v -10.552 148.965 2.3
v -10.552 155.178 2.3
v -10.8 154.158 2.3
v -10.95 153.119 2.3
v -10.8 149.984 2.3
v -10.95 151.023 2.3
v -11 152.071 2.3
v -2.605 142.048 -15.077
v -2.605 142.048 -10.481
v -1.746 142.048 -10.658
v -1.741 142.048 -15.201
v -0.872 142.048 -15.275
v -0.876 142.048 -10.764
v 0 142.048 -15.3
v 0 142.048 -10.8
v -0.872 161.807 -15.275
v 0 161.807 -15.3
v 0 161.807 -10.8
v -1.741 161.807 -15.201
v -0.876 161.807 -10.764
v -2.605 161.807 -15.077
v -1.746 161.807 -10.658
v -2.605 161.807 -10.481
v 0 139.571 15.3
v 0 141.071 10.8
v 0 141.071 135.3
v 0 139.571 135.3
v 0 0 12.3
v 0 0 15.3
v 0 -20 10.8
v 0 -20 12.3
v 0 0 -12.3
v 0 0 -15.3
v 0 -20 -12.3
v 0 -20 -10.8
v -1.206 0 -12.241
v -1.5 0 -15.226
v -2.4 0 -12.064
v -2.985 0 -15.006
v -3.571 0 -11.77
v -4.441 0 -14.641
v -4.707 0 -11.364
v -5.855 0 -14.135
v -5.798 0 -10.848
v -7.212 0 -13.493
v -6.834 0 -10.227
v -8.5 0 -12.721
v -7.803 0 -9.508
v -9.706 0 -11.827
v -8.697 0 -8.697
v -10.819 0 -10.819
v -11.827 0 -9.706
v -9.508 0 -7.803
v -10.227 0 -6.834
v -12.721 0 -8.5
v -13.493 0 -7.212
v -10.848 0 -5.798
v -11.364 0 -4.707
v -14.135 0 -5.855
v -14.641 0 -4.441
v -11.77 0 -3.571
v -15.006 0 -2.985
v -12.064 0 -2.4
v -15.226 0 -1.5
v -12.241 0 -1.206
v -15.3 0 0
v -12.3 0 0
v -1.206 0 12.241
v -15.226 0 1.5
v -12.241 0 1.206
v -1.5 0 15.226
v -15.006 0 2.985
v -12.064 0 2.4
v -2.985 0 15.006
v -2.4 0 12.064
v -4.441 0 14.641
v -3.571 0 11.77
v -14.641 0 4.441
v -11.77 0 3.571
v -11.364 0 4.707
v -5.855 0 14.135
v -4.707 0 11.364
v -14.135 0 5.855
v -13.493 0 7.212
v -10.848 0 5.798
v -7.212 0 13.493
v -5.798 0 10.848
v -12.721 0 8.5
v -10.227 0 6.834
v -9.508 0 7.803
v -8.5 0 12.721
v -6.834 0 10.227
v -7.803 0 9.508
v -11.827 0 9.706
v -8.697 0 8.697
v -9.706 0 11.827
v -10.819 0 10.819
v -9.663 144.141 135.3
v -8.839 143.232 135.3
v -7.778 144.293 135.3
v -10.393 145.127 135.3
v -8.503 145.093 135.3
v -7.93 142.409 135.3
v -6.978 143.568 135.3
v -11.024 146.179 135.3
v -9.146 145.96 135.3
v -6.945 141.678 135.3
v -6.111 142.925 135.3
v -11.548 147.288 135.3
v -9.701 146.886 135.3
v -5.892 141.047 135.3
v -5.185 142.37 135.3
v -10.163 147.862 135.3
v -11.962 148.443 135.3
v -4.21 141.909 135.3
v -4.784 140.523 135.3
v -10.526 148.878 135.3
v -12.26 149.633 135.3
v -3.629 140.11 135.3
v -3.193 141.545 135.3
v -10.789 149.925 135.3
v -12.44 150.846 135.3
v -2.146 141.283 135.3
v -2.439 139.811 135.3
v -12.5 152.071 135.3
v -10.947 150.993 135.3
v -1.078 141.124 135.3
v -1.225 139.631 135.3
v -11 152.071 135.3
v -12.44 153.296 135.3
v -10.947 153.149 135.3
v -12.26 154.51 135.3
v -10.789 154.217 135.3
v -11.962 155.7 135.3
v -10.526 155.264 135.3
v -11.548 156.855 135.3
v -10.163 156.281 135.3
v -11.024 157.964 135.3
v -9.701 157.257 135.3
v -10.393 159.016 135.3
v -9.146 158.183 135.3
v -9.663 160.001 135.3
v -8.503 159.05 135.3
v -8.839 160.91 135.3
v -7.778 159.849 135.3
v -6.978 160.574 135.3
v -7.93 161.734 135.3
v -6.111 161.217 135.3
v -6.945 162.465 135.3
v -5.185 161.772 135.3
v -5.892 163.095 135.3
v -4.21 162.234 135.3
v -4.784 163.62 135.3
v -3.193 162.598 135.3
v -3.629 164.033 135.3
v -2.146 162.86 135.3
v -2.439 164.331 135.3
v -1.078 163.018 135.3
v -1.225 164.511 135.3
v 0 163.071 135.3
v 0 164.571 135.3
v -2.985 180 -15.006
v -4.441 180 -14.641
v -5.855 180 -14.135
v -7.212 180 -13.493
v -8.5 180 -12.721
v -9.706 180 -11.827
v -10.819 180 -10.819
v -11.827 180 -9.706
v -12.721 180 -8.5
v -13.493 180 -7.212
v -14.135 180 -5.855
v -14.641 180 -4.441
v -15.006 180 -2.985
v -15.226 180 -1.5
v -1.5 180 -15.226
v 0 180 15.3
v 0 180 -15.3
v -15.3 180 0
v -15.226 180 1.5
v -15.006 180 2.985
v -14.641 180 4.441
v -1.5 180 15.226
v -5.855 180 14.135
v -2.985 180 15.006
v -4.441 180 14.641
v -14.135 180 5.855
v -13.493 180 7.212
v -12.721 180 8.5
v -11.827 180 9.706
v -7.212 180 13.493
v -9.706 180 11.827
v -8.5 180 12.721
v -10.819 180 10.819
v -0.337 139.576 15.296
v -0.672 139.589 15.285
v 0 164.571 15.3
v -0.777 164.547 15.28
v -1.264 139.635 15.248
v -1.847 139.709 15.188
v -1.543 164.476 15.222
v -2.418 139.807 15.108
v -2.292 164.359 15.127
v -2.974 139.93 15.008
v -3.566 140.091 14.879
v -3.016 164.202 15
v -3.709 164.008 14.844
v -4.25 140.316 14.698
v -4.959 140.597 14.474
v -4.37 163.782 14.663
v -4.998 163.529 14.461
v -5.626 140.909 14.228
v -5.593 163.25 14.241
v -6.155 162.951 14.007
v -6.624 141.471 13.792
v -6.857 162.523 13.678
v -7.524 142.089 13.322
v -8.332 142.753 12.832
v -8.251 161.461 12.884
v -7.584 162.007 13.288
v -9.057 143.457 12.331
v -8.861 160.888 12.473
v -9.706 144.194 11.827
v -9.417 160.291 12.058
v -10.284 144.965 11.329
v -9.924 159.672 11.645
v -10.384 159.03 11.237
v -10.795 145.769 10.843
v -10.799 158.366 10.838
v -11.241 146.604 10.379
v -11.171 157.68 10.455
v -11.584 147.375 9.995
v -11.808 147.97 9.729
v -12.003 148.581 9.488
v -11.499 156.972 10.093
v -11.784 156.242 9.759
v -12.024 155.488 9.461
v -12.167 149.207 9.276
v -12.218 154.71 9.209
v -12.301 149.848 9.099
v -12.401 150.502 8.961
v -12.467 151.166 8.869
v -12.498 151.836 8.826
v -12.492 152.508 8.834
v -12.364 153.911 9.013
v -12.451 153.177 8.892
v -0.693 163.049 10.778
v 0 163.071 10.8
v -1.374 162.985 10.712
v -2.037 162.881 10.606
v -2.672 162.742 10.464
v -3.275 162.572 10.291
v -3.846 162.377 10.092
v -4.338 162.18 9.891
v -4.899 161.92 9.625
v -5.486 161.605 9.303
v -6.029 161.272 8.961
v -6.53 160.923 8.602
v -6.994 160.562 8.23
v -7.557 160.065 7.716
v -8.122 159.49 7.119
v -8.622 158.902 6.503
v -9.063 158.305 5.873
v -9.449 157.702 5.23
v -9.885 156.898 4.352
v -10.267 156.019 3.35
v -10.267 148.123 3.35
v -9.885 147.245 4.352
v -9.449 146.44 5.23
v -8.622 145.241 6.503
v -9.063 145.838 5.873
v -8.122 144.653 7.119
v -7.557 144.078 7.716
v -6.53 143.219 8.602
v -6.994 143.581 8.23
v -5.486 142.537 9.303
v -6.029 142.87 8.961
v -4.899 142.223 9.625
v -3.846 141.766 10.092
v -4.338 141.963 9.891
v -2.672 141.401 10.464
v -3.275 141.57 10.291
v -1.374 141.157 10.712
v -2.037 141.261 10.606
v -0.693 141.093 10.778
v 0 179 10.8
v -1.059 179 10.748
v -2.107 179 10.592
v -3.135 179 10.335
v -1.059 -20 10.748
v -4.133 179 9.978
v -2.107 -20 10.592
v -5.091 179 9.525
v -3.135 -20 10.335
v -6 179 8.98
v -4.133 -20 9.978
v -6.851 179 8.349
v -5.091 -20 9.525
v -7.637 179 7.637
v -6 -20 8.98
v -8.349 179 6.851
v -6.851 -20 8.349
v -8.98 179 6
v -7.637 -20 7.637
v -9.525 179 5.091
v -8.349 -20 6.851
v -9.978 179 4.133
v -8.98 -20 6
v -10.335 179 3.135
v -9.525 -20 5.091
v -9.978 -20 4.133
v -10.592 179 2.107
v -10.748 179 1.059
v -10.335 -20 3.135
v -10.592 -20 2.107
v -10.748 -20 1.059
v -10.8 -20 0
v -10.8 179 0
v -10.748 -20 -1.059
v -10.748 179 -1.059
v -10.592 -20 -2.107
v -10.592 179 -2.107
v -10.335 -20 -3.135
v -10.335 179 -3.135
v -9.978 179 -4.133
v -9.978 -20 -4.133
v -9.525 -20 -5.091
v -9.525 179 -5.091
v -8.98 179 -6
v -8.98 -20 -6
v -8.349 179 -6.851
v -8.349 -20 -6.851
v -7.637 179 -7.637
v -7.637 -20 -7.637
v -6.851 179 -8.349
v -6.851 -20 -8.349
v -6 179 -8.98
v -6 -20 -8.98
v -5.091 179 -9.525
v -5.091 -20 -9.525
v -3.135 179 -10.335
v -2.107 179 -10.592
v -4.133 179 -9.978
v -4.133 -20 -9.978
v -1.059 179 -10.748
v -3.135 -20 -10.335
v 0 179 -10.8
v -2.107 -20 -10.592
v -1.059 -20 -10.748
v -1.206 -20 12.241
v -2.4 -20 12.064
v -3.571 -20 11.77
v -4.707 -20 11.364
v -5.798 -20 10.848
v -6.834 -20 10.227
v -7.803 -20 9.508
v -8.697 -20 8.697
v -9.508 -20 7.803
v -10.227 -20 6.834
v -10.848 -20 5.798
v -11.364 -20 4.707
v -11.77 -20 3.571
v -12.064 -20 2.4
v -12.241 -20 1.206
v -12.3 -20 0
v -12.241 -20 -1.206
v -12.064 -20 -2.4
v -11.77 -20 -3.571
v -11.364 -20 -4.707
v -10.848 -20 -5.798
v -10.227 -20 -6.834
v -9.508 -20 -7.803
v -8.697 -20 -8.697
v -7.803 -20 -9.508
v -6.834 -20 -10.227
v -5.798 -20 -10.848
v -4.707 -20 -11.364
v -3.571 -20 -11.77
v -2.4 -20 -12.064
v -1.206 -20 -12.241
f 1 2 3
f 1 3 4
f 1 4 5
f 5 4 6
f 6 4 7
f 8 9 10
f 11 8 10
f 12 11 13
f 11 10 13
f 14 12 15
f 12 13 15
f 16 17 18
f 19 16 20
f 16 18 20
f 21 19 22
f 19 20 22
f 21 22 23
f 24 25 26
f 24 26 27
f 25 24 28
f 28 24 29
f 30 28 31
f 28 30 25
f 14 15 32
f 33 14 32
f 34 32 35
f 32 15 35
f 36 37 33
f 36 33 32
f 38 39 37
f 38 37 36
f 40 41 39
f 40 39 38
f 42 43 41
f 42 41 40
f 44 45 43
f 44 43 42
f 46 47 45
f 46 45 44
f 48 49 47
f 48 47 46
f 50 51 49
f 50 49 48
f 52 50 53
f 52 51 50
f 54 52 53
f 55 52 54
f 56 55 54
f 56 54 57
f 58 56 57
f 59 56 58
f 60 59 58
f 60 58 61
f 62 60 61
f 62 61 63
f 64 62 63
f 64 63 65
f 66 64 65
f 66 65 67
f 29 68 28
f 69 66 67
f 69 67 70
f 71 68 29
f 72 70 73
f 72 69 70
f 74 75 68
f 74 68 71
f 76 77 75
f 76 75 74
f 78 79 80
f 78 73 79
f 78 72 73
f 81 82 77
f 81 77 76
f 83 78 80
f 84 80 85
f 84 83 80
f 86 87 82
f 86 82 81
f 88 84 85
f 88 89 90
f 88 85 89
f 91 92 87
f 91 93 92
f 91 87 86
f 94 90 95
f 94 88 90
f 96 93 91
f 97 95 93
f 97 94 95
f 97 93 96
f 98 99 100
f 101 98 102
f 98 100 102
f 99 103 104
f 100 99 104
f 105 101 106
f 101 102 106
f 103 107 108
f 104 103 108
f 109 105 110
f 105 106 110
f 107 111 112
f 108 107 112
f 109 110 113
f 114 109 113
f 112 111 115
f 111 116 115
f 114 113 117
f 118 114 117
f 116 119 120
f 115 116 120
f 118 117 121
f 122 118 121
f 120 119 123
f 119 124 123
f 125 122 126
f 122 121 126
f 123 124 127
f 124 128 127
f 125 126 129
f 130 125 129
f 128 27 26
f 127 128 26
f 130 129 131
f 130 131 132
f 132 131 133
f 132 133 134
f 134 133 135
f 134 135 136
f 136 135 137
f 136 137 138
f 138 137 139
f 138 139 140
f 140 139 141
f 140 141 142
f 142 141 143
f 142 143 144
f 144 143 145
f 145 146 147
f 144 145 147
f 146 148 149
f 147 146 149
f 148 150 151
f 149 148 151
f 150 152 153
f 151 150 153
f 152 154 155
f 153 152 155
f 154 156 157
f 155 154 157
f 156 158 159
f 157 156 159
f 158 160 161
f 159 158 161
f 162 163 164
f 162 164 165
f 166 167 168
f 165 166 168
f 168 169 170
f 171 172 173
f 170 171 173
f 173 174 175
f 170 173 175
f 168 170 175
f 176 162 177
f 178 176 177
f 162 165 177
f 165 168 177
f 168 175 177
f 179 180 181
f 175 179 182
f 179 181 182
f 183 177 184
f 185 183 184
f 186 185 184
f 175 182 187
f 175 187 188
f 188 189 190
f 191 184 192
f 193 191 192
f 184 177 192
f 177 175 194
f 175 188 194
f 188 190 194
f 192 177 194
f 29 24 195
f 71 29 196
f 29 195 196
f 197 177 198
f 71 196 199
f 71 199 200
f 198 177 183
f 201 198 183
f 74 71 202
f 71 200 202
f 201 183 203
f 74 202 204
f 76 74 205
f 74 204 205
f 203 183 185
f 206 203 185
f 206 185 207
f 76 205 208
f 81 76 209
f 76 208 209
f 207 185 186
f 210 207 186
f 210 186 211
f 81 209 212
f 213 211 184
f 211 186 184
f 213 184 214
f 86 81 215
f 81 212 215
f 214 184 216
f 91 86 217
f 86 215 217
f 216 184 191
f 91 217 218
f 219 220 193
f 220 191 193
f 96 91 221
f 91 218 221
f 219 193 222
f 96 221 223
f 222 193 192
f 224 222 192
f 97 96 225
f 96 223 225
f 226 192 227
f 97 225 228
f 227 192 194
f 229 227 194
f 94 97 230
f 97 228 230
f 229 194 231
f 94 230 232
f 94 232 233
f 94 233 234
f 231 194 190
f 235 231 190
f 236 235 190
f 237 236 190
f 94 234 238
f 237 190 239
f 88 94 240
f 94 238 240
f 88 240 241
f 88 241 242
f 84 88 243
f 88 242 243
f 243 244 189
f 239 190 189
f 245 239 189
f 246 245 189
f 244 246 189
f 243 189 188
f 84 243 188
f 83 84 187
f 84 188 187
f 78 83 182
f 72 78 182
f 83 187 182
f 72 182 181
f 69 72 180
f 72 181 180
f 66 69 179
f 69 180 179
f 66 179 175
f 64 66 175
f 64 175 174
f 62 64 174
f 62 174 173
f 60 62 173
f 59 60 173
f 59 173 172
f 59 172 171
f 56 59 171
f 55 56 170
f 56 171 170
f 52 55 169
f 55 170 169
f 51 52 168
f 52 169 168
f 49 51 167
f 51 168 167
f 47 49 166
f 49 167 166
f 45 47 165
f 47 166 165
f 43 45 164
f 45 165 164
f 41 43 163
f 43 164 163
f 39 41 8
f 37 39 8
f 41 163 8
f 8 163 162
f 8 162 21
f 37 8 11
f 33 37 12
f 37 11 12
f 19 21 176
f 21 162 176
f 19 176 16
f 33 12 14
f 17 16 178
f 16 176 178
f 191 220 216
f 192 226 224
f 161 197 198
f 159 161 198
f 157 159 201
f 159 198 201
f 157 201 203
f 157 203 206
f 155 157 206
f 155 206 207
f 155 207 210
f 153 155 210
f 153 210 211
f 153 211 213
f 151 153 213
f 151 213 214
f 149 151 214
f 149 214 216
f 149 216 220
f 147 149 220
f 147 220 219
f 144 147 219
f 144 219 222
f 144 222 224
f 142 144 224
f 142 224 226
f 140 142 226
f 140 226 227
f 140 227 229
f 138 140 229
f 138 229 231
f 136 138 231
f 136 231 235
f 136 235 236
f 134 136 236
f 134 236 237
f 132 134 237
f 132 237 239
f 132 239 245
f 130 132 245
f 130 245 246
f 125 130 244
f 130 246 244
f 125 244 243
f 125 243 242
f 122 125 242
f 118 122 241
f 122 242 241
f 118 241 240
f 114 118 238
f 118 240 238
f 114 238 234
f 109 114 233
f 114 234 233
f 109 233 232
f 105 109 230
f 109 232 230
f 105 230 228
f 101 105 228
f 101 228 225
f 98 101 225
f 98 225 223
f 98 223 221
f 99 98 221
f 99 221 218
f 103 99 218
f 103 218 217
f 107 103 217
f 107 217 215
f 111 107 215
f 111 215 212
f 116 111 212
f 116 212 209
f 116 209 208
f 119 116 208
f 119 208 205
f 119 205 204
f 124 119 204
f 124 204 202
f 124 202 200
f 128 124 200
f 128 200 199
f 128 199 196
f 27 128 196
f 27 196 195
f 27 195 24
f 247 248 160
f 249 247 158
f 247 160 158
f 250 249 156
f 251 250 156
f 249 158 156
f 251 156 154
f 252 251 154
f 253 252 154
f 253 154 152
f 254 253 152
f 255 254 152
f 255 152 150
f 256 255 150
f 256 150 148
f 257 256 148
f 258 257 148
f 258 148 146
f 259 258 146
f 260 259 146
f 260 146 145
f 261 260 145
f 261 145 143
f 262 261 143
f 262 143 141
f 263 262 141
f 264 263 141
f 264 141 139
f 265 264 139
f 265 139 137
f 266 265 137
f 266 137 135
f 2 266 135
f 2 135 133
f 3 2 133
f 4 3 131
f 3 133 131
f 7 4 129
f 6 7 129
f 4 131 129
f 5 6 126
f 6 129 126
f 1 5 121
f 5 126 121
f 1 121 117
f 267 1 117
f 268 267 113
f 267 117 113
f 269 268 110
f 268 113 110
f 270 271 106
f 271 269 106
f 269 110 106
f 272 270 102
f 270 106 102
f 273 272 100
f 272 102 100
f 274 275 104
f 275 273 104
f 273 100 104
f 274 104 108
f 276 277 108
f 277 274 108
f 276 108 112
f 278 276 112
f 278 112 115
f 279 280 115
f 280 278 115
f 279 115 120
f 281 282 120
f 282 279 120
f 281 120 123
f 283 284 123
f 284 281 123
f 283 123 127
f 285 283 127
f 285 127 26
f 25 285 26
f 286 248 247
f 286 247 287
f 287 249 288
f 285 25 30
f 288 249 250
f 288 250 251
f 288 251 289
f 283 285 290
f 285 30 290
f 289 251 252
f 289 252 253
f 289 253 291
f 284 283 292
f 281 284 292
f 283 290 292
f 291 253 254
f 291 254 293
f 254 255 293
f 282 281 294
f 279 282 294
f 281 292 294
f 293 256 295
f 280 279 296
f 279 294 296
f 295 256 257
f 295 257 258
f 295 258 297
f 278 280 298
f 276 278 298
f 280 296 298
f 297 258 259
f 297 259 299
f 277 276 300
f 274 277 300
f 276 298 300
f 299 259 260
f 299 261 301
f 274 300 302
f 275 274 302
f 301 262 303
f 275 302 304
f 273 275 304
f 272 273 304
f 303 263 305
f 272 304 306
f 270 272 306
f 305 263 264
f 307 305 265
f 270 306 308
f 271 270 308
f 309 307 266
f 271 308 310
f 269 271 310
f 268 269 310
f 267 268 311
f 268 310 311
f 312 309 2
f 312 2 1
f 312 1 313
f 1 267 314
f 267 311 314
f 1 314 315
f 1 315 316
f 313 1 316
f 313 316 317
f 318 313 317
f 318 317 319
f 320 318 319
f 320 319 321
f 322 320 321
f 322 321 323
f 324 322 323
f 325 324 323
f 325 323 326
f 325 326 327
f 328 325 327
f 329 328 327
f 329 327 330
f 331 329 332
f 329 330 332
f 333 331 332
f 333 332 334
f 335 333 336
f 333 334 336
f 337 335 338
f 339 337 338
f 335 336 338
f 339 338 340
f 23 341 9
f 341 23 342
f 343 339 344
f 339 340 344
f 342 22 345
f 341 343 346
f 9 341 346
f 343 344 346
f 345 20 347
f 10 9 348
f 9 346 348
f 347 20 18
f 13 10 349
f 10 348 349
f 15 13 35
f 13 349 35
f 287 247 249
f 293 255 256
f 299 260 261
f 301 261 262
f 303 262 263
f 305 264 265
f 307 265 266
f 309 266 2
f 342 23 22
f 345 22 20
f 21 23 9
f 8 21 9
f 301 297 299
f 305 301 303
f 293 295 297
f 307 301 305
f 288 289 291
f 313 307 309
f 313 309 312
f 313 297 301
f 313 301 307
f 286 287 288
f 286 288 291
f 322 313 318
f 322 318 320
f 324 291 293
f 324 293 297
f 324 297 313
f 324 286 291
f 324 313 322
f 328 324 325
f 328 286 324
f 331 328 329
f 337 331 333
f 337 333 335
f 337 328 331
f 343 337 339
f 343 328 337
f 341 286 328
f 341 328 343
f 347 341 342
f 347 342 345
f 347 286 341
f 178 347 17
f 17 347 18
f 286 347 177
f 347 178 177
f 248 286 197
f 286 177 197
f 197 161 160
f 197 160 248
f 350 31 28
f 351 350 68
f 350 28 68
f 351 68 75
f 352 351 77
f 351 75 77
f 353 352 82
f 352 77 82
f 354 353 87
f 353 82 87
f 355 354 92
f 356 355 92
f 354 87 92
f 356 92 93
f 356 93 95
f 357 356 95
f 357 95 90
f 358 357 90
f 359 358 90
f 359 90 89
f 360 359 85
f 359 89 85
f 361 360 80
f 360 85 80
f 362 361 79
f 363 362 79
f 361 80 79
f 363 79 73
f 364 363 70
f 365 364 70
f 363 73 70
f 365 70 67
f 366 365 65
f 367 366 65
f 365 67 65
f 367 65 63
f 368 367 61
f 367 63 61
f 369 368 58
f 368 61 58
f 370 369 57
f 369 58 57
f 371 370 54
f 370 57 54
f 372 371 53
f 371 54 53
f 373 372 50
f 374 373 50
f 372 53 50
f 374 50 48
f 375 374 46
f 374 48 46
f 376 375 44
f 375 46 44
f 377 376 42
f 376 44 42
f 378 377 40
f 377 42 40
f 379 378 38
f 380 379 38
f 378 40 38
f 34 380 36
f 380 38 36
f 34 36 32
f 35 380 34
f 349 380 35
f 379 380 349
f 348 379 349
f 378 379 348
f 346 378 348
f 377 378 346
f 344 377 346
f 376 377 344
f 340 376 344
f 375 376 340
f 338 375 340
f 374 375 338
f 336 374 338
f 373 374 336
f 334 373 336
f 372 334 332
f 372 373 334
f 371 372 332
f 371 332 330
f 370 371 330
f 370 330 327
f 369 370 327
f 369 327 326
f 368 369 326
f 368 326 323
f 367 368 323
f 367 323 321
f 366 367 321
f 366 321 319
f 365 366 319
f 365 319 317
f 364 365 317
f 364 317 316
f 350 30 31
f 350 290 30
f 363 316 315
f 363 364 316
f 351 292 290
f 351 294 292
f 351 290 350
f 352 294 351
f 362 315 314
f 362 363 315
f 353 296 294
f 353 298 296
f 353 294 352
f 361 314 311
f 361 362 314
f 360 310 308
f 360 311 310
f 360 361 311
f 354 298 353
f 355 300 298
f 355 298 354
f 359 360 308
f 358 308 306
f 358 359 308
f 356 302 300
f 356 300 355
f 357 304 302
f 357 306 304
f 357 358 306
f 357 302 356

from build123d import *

# Parameters (mm, degrees)
SKETCH1_W                = 15.3
SKETCH1_H                = 180
SKETCH1_W_2              = 12.3
SKETCH1_H_2              = 20
BOSS_EXTRUDE1_DEPTH      = 120
BOSS_EXTRUDE1_DEPTH_BACK = 9
SKETCH4_R                = 12.5
BOSS_EXTRUDE2_START      = -25
SKETCH6_W                = 40
SKETCH6_H                = 18
SKETCH6_W_2              = 36
SKETCH6_H_2              = 14
BOSS_EXTRUDE2_DEPTH      = 10
SKETCH2_R                = 10.8
CUT_EXTRUDE1_DEPTH       = 199
SKETCH5_R                = 11
CUT_EXTRUDE2_DEPTH       = 133
SKETCH7_W                = 36
SKETCH7_H                = 14
CUT_EXTRUDE3_DEPTH       = 15
BOSS_EXTRUDE3_START      = -11
SKETCH8_W                = 5.5
SKETCH8_H                = 22
BOSS_EXTRUDE3_DEPTH      = 6
SKETCH9_R                = 1.75
BOSS_EXTRUDE4_DEPTH      = 2
SKETCH10_W               = 36
SKETCH10_H               = 14
SKETCH10_R               = 4
BOSS_EXTRUDE5_DEPTH      = 1
CUT_EXTRUDE5_DEPTH       = 215


with BuildPart() as part:
    # Sketch1 → Revolve1 (revolve)
    with BuildSketch(Plane.XY, mode=Mode.PRIVATE) as revolve1_sk:
        with Locations((-7.65, 90)):
            Rectangle(SKETCH1_W, SKETCH1_H)
        with Locations((-6.15, -10)):
            Rectangle(SKETCH1_W_2, SKETCH1_H_2)
    revolve(revolve1_sk.sketch.rotate(Axis((0, 259.808396335, 0), (0, -1, 0)), 270), axis=Axis((0, 259.808396335, 0), (0, -1, 0)))

    # Sketch4 → Boss-Extrude1 (add, two sides: drawn at the far end of the back side and taken through both)
    with BuildSketch(Plane.XY.offset(15.3).offset(-BOSS_EXTRUDE1_DEPTH_BACK)):
        with Locations((0, 152.071263422)):
            Circle(SKETCH4_R)
    extrude(amount=BOSS_EXTRUDE1_DEPTH + BOSS_EXTRUDE1_DEPTH_BACK)

    # Sketch6 → Boss-Extrude2 (add)
    with BuildSketch(Plane.ZY.offset(12.5).offset(BOSS_EXTRUDE2_START)):
        with Locations((115.3, 152.071263422)):
            Rectangle(SKETCH6_W, SKETCH6_H)
        with Locations((115.3, 152.071263422)):
            Rectangle(SKETCH6_W_2, SKETCH6_H_2, mode=Mode.SUBTRACT)
    extrude(amount=BOSS_EXTRUDE2_DEPTH)

    # Sketch2 → Cut-Extrude1 (cut)
    with BuildSketch(Plane.XZ.offset(20)):
        with Locations(Location((0, 0, 0), (0, 0, 270))):
            Circle(SKETCH2_R)
    extrude(amount=-CUT_EXTRUDE1_DEPTH, mode=Mode.SUBTRACT)

    # Sketch5 → Cut-Extrude2 (cut)
    with BuildSketch(Plane.XY.offset(135.3)):
        with Locations((0, 152.071263422)):
            Circle(SKETCH5_R)
    extrude(amount=-CUT_EXTRUDE2_DEPTH, mode=Mode.SUBTRACT)

    # Sketch7 → Cut-Extrude3 (cut)
    with BuildSketch(Plane(origin=(12.5, 0, 0), x_dir=(0, 0, -1), z_dir=(1, 0, 0))):
        with Locations((-115.3, 152.071263422)):
            Rectangle(SKETCH7_W, SKETCH7_H)
    extrude(amount=-CUT_EXTRUDE3_DEPTH, mode=Mode.SUBTRACT)

    # Sketch8 → Boss-Extrude3 (add)
    with BuildSketch(Plane.XY.offset(97.3).offset(BOSS_EXTRUDE3_START)):
        with Locations((2.75, 152.071263422)):
            Rectangle(SKETCH8_W, SKETCH8_H)
        with BuildLine():
            ThreePointArc((8.485281374, 159.071263422), (7.105810702, 160.468135117), (5.5, 161.597542863))
            Line((5.5, 161.597542863), (5.5, 142.54498398))
            ThreePointArc((5.5, 142.54498398), (7.105810702, 143.674391726), (8.485281374, 145.071263422))
            ThreePointArc((8.485281374, 145.071263422), (11, 152.071263422), (8.485281374, 159.071263422))
        make_face()
    extrude(amount=-BOSS_EXTRUDE3_DEPTH)

    # Sketch9 → Boss-Extrude4 (add)
    with BuildSketch(Plane.ZY):
        with Locations((83.05, 159.671263422)):
            Circle(SKETCH9_R)
        with Locations(Location((83.05, 144.471263422, 0), (0, 0, 180))):
            Circle(SKETCH9_R)
    extrude(amount=BOSS_EXTRUDE4_DEPTH)

    # Sketch10 → Boss-Extrude5 (add)
    with BuildSketch(Plane(origin=(12.5, 0, 0), x_dir=(0, 0, -1), z_dir=(1, 0, 0))):
        with Locations((-115.3, 152.071263422)):
            Rectangle(SKETCH10_W, SKETCH10_H)
        with Locations((-127.3, 152.071263422)):
            Circle(SKETCH10_R, mode=Mode.SUBTRACT)
        with Locations((-115.3, 152.071263422)):
            Circle(SKETCH10_R, mode=Mode.SUBTRACT)
        with Locations((-103.3, 152.071263422)):
            Circle(SKETCH10_R, mode=Mode.SUBTRACT)
    extrude(amount=-BOSS_EXTRUDE5_DEPTH)

    # Sketch12 → Cut-Extrude5 (cut)
    with BuildSketch(Plane.XY.offset(135.3)):
        with BuildLine():
            Line((15.3, 180), (0, 180))
            Line((0, 180), (0, 164.571263422))
            ThreePointArc((0, 164.571263422), (4.677071733, 163.663286541), (8.674675786, 161.071263422))
            Line((8.674675786, 161.071263422), (12.5, 161.071263422))
            Line((12.5, 161.071263422), (12.5, 143.071263422))
            Line((12.5, 143.071263422), (8.674675786, 143.071263422))
            ThreePointArc((8.674675786, 143.071263422), (4.677071733, 140.479240302), (0, 139.571263422))
            Line((0, 139.571263422), (0, -20))
            Line((0, -20), (15.3, -20))
            Line((15.3, -20), (15.3, 180))
        make_face()
        with BuildLine():
            ThreePointArc((8.674675786, 161.071263422), (4.677071733, 163.663286541), (0, 164.571263422))
            Line((0, 164.571263422), (0, 163.071263422))
            ThreePointArc((0, 163.071263422), (7.778174593, 159.849438015), (11, 152.071263422))
            ThreePointArc((11, 152.071263422), (7.778174593, 144.293088829), (0, 141.071263422))
            Line((0, 141.071263422), (0, 139.571263422))
            ThreePointArc((0, 139.571263422), (4.677071733, 140.479240302), (8.674675786, 143.071263422))
            Line((8.674675786, 143.071263422), (12.5, 143.071263422))
            Line((12.5, 143.071263422), (12.5, 161.071263422))
            Line((12.5, 161.071263422), (8.674675786, 161.071263422))
        make_face()
        with BuildLine():
            ThreePointArc((11, 152.071263422), (7.778174593, 159.849438015), (0, 163.071263422))
            Line((0, 163.071263422), (0, 161.806579982))
            Line((0, 161.806579982), (-2.604703903, 161.806579982))
            Line((-2.604703903, 161.806579982), (-2.604703903, 142.047887239))
            Line((-2.604703903, 142.047887239), (0, 142.047887239))
            Line((0, 142.047887239), (0, 141.071263422))
            ThreePointArc((0, 141.071263422), (7.778174593, 144.293088829), (11, 152.071263422))
        make_face()
    extrude(amount=-CUT_EXTRUDE5_DEPTH, mode=Mode.SUBTRACT)


solid = part.part
